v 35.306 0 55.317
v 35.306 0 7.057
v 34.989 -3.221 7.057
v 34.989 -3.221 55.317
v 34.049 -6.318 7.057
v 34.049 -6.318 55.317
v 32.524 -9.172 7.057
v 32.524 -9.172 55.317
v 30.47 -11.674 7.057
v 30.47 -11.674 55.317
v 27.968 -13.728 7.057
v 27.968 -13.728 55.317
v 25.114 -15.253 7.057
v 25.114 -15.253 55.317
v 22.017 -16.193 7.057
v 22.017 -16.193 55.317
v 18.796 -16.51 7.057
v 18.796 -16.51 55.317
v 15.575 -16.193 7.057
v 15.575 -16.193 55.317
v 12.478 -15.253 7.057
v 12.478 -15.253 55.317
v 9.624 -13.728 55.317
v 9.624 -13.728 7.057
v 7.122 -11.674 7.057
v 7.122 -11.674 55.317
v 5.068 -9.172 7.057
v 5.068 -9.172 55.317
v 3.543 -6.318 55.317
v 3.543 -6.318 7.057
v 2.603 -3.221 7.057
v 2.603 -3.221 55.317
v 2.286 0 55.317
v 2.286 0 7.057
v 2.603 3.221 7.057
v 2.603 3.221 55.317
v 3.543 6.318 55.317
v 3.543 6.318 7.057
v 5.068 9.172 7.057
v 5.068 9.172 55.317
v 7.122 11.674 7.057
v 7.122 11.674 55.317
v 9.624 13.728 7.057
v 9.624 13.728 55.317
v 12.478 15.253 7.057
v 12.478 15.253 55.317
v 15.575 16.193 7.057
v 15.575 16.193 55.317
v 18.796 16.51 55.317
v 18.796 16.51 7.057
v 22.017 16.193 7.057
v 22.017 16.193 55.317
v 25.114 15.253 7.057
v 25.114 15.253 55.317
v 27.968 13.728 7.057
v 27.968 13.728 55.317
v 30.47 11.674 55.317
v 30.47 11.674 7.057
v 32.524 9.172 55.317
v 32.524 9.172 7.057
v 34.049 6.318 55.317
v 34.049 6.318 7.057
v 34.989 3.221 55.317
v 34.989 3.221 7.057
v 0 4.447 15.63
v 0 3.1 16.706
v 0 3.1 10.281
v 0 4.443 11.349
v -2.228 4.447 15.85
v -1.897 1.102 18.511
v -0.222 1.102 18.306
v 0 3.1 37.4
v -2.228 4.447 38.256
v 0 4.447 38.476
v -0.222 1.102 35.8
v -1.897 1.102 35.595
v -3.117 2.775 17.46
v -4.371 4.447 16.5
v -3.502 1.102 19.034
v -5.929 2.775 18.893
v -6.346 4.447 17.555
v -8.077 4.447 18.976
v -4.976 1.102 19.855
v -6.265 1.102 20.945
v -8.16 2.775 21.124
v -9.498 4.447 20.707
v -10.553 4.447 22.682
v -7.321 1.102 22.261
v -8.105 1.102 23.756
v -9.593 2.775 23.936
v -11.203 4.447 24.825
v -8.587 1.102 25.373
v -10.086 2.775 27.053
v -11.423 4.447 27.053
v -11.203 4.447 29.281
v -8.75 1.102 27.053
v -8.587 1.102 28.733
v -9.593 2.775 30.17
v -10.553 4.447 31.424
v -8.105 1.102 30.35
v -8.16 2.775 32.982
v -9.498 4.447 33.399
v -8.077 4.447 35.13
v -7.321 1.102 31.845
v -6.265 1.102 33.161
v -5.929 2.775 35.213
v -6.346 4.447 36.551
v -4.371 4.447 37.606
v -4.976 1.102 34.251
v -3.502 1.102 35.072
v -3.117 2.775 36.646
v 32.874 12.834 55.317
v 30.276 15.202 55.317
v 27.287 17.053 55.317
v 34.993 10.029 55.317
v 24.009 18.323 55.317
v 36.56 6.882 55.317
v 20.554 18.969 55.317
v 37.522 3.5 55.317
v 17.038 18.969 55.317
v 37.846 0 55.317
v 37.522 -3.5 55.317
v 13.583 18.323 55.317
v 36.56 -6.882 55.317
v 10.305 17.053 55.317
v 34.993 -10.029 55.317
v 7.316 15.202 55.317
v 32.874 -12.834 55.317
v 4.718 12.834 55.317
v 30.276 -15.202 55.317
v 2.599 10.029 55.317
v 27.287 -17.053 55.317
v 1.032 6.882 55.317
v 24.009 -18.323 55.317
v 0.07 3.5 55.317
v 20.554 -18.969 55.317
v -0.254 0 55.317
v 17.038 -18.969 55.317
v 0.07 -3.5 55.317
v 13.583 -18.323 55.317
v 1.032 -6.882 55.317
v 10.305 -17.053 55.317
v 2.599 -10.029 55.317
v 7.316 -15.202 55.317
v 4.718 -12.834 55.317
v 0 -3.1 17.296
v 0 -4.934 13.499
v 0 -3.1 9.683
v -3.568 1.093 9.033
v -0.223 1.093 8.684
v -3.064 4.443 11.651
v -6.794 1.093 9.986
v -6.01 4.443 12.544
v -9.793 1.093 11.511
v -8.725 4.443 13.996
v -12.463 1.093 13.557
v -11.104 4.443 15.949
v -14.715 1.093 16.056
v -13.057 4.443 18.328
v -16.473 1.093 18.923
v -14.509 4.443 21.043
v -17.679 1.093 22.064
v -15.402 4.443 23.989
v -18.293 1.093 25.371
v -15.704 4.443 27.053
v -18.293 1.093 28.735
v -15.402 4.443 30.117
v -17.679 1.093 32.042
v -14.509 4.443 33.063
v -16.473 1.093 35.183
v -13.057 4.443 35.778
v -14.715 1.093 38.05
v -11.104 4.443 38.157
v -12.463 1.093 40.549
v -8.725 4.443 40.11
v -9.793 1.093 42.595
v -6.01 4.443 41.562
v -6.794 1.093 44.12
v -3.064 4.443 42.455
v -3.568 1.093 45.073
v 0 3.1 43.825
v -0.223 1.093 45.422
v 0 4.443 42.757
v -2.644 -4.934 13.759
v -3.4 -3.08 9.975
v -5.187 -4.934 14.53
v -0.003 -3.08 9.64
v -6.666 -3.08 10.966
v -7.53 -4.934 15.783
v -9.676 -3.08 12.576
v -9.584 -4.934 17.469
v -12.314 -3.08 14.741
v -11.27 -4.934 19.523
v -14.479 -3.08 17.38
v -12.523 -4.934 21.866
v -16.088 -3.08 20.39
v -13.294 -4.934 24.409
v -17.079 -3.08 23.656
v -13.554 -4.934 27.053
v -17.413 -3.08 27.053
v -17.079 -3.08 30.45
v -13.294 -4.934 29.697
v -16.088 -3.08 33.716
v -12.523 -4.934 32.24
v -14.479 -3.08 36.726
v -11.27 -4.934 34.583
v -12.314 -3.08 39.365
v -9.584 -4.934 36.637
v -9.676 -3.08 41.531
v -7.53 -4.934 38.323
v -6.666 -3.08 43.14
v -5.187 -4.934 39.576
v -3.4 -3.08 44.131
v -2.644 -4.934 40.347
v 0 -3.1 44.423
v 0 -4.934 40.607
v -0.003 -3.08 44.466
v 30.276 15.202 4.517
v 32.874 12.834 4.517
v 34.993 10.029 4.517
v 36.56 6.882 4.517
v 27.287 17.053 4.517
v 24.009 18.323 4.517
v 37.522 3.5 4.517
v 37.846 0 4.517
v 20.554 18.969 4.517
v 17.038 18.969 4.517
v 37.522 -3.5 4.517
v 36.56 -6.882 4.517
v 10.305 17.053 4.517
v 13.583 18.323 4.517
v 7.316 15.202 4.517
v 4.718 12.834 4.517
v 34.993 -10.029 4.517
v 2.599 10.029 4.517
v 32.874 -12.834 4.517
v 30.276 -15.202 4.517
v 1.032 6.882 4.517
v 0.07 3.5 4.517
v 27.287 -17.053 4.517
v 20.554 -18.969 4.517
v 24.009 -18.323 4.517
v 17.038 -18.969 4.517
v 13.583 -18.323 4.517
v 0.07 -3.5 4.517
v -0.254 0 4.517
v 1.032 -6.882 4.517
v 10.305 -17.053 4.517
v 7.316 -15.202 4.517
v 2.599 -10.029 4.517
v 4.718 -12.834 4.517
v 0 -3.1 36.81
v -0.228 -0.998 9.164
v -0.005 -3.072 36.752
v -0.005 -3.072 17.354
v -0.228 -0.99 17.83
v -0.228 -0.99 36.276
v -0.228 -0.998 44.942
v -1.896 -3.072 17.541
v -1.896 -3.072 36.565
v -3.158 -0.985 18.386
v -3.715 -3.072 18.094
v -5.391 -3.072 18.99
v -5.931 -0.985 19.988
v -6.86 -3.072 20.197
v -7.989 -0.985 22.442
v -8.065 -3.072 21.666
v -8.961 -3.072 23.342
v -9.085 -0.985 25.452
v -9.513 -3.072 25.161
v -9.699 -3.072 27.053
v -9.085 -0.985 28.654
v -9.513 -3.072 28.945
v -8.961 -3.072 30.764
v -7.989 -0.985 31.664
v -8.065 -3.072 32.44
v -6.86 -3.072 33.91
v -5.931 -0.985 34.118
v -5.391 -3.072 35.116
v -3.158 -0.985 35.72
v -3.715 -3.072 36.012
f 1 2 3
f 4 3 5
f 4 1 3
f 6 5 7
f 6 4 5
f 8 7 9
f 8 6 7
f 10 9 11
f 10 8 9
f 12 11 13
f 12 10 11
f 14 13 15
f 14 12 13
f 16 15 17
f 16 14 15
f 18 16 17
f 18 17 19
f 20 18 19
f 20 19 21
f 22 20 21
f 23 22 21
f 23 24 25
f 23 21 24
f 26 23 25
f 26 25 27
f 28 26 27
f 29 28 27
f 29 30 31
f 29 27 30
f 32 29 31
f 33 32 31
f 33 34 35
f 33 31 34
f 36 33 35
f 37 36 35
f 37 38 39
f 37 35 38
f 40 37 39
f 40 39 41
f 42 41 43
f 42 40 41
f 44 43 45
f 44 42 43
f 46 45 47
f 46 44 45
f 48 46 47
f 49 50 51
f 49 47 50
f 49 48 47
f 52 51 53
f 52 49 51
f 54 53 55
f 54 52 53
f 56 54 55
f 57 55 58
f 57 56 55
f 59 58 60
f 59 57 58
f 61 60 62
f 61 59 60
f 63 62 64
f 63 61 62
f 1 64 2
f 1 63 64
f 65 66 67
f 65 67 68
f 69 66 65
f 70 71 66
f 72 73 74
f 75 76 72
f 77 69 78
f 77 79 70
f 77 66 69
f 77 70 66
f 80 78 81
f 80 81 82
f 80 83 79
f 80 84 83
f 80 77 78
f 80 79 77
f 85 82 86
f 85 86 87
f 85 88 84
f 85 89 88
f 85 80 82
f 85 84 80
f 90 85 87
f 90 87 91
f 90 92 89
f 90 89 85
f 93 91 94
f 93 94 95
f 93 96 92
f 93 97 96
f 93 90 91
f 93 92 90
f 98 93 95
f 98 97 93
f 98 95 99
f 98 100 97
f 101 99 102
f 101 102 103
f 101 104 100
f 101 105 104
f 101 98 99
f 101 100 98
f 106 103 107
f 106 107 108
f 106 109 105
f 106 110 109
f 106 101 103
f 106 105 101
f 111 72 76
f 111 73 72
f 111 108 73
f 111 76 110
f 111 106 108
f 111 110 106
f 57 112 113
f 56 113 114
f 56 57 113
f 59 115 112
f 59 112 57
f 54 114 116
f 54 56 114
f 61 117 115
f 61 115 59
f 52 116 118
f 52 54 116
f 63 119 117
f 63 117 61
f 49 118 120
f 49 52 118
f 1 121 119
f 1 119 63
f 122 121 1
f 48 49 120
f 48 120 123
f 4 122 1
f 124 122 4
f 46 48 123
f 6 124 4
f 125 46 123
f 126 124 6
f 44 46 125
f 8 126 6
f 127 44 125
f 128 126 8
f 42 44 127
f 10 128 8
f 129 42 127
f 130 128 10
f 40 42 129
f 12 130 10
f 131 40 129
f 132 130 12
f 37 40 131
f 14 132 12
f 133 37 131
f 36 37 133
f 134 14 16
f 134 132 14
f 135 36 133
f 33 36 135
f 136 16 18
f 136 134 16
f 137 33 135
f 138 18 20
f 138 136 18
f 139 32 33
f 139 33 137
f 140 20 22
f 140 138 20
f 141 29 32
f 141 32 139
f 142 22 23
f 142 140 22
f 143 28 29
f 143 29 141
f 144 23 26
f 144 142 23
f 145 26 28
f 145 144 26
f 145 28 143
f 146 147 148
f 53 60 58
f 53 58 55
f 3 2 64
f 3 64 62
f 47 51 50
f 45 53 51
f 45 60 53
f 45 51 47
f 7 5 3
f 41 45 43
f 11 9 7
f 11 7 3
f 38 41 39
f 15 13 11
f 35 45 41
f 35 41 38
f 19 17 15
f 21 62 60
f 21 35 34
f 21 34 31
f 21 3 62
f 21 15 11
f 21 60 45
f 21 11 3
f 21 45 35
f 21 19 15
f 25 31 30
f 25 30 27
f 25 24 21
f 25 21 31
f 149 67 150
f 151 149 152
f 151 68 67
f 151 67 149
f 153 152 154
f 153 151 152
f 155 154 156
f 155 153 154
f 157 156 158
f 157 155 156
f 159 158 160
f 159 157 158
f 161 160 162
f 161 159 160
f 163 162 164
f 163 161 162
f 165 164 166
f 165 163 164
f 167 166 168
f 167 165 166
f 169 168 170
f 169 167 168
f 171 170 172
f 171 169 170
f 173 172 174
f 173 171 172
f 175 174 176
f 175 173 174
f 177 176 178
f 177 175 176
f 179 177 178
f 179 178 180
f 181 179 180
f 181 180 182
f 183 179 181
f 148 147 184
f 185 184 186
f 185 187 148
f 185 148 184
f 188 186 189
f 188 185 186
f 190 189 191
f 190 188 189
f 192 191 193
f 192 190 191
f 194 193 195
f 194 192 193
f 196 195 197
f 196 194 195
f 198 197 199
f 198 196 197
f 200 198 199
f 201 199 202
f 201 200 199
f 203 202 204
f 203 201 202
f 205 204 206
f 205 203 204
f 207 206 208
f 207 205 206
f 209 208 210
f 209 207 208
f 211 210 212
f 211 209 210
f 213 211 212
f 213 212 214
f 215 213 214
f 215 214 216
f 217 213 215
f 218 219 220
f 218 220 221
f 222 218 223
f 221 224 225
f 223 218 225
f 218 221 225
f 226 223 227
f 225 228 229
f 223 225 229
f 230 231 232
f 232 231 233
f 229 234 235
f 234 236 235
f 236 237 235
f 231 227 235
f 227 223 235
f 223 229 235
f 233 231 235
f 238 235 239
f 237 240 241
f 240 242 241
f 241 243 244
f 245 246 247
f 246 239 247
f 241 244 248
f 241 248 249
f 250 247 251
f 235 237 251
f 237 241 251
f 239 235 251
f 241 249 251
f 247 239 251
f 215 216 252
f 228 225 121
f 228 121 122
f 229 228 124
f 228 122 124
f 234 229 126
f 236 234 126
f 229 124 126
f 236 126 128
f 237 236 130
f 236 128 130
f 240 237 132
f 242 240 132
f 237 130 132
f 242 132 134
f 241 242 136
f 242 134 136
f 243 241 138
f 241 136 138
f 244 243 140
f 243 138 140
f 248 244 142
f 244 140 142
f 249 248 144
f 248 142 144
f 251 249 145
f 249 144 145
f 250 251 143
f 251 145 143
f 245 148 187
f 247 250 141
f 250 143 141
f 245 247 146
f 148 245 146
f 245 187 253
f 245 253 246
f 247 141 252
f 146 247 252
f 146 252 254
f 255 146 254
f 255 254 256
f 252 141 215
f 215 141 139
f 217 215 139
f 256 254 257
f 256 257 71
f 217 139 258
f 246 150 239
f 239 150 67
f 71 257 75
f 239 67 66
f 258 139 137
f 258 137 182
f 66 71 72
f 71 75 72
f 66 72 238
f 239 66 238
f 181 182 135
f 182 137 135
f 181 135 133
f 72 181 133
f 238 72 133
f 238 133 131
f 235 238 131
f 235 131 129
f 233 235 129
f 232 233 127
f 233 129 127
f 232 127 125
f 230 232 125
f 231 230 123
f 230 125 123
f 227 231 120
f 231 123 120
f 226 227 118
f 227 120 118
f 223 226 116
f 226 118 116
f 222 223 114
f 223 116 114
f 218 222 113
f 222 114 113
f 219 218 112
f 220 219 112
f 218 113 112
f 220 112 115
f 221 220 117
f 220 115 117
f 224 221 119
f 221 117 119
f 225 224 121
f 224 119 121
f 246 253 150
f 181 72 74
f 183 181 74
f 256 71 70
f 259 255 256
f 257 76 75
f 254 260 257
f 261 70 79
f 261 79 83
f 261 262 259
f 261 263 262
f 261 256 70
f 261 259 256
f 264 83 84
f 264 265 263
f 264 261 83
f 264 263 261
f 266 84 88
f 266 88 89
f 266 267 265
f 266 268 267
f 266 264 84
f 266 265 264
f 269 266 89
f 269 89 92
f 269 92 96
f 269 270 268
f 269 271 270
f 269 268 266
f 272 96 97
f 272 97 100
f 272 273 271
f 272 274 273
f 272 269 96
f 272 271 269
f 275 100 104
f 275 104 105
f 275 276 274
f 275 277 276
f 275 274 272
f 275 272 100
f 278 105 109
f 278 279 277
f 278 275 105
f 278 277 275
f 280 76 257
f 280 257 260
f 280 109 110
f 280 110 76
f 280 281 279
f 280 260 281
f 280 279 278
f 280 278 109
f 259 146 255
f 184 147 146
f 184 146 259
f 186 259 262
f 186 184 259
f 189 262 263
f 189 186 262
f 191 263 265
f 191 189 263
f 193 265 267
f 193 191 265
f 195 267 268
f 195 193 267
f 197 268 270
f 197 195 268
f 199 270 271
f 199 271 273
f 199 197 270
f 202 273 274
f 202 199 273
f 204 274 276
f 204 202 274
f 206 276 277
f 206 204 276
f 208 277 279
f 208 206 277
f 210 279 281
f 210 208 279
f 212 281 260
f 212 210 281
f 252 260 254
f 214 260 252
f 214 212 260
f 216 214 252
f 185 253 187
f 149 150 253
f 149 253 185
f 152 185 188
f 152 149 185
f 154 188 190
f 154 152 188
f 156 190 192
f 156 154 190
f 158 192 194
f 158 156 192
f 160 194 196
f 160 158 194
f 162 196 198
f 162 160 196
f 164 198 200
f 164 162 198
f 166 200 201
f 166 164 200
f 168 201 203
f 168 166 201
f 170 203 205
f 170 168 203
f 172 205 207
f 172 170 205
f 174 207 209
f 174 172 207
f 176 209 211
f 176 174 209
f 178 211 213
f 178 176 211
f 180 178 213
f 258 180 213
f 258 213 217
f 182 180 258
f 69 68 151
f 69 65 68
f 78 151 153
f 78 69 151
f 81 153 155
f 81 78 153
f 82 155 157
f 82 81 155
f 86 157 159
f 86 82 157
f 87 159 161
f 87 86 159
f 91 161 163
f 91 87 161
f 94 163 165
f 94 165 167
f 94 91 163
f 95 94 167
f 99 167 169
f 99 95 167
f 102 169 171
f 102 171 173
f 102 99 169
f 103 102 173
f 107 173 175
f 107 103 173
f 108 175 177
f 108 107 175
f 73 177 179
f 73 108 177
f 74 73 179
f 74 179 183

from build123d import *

# Parameters (mm, degrees)
F0_W     = 19.05
F0_H     = 50.8
F2_T     = -2.54
F4_ANGLE = 180


with BuildPart() as f1:
    # F0 (on Front) → F1 (revolve)
    with BuildSketch(Plane.XZ):
        with Locations((28.321, 29.9166932978)):
            Rectangle(F0_W, F0_H)
    revolve(axis=Axis((18.796, 0, 29.9166932978), (0, 0, -1)))

    # F2
    f2_openings = [f1.faces().sort_by_distance(p)[0] for p in [
        (18.796, 0, 55.316693),
    ]]
    offset(amount=F2_T, openings=f2_openings)

    # F3 (on Right) → F4 (revolve)
    with BuildSketch(Plane.YZ):
        Polygon((-4.9335755283, 13.4986876266), (-3.0797308855, 9.639682645), (1.0932139292, 8.683026499), (4.4429463577, 11.3491007788), (4.4470495593, 15.6302971737), (1.1024337395, 18.3027874778), (-3.0723371717, 17.3541319833), align=None)
    revolve(axis=Axis((0, -0.516686556, 27.0530247144), (0, 1, 0)), revolution_arc=F4_ANGLE)


solid = f1.part
